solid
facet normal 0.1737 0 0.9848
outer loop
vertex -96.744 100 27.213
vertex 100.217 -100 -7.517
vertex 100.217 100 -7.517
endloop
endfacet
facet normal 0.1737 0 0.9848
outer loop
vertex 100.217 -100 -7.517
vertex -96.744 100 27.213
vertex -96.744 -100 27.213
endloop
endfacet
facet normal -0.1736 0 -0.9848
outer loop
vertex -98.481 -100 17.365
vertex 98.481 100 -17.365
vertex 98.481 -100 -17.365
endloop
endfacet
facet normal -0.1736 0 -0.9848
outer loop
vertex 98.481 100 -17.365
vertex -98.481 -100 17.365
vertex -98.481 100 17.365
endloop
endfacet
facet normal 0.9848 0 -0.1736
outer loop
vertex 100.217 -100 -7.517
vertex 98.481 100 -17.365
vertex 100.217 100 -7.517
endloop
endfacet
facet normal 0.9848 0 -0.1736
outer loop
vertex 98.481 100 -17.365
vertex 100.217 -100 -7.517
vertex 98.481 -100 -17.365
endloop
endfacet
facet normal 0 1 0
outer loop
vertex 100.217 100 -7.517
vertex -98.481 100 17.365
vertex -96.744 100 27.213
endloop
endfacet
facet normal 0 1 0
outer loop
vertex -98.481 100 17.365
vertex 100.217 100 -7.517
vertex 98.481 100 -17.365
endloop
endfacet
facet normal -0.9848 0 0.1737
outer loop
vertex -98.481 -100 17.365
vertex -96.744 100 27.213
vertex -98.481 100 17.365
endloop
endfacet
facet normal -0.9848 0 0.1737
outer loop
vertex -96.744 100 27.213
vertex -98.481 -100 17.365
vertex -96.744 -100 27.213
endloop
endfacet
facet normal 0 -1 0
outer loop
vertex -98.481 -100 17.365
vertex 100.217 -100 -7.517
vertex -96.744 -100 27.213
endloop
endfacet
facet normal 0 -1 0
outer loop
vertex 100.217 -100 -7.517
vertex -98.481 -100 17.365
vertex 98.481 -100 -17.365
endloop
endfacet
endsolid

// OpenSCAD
module rounderer(x, y, rot, r = 3) {
  //r = 3;
  l = 20;
  
  translate([x, y, 0]) {
    rotate([0, 0, rot]){
      translate([-r, -r, -l]) {
        difference() {
          cube([2*r, 2*r, 2*l]);
          cylinder(2*l, r, r, false);
        }
      }
    }
  }
}



module trimmer(a, rot) {
  
  l = 200;
  
  rotate([a,0, rot])
    translate([-l/2, -l/2, 0])
      cube([l, l, 10]);
  
  
}



trimmer(10, 90);
